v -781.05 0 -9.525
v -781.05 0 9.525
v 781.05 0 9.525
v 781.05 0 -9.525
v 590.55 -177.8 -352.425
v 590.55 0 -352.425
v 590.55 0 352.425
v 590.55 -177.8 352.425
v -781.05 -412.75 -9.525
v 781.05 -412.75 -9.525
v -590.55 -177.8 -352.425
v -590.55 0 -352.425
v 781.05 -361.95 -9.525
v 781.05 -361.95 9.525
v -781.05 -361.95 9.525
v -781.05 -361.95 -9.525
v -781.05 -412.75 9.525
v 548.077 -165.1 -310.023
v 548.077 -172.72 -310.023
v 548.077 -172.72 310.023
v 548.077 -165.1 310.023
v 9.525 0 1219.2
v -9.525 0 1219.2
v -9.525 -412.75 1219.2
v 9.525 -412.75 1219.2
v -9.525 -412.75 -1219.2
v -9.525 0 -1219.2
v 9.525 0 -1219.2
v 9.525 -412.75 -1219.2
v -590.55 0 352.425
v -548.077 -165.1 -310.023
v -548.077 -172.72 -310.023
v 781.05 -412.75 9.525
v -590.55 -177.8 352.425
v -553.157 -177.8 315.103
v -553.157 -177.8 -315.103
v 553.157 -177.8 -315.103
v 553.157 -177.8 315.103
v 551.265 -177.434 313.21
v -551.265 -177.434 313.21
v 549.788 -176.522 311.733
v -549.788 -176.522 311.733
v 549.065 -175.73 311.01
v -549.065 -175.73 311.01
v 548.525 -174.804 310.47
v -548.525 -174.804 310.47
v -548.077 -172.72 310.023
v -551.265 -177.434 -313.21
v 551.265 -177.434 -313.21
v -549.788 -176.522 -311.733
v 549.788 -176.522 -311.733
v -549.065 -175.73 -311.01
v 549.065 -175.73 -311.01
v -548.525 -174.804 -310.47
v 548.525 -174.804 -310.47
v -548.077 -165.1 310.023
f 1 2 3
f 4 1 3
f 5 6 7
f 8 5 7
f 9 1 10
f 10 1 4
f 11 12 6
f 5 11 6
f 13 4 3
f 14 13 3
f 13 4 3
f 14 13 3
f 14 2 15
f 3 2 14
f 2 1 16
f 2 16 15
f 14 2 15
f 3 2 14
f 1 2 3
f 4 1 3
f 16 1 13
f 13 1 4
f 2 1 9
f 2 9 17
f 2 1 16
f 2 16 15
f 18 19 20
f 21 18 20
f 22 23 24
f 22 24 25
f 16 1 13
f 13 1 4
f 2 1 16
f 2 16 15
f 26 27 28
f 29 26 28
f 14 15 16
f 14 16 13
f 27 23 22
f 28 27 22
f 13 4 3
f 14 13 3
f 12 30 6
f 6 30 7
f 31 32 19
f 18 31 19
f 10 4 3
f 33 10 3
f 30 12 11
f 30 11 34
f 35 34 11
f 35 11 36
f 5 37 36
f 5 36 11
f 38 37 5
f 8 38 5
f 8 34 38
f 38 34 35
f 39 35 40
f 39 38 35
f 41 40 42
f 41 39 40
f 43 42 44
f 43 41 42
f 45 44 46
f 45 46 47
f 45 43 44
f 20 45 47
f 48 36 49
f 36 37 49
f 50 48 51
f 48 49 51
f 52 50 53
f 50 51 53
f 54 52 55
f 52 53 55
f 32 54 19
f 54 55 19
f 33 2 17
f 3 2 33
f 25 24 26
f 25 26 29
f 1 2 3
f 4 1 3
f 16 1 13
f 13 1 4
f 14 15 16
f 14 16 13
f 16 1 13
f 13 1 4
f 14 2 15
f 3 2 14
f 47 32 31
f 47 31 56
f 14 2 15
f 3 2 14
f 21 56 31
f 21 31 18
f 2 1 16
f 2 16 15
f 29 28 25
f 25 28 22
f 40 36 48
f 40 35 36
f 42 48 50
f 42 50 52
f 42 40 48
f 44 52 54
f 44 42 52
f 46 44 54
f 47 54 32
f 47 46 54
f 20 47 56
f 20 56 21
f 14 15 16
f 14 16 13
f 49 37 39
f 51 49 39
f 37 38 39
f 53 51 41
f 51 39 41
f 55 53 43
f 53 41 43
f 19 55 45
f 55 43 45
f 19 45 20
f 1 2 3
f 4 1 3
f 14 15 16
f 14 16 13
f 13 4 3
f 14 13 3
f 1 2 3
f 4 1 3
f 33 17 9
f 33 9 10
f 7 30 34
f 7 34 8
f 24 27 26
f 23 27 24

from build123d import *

# Parameters (mm, degrees)
F0_W      = 1181.1
F0_H      = 704.85
F1_DEPTH  = 177.8
F4_W      = 1562.1
F4_H      = 19.05
F5_DEPTH  = 412.75
F6_DEPTH  = 361.95
F7_DEPTH  = 361.95
F8_DEPTH  = 361.95
F9_DEPTH  = 361.95
F3_W      = 19.05
F3_H      = 2438.4
F10_DEPTH = 412.75
F2_W      = 1096.154452
F2_H      = 620.045066
F11_DEPTH = 12.7
F13_R     = 5.08


with BuildPart() as f1:
    # F0 (on Front) → F1 (new body)
    with BuildSketch(Plane.XZ):
        Rectangle(F0_W, F0_H)
    extrude(amount=F1_DEPTH)


with BuildPart() as f5:
    # F4 (on Front) → F5 (new body)
    with BuildSketch(Plane.XZ):
        Rectangle(F4_W, F4_H)
    extrude(amount=F5_DEPTH)


with BuildPart() as f6:
    # F4 (on Front) → F6 (new body)
    with BuildSketch(Plane.XZ):
        Rectangle(F4_W, F4_H)
    extrude(amount=F6_DEPTH)


with BuildPart() as f7:
    # F4 (on Front) → F7 (new body)
    with BuildSketch(Plane.XZ):
        Rectangle(F4_W, F4_H)
    extrude(amount=F7_DEPTH)


with BuildPart() as f8:
    # F4 (on Front) → F8 (new body)
    with BuildSketch(Plane.XZ):
        Rectangle(F4_W, F4_H)
    extrude(amount=F8_DEPTH)


with BuildPart() as f9:
    # F4 (on Front) → F9 (new body)
    with BuildSketch(Plane.XZ):
        Rectangle(F4_W, F4_H)
    extrude(amount=F9_DEPTH)


with BuildPart() as f10:
    # F3 (on Front) → F10 (new body)
    with BuildSketch(Plane.XZ):
        Rectangle(F3_W, F3_H)
    extrude(amount=F10_DEPTH)


with BuildPart() as f11:
    # F2 (on face) → F11 (new body, symmetric)
    with BuildSketch(Plane.XZ.offset(177.8)):
        Rectangle(F2_W, F2_H)
    extrude(amount=F11_DEPTH, both=True)


with BuildPart() as f1_1:
    add(f1.part)

    # F12: cut F11
    add(f11.part, mode=Mode.SUBTRACT)

    # F13
    f13_edges = [f1_1.edges().sort_by_distance(p)[0] for p in [
        (-548.077226, -177.8, 0),
        (0, -177.8, 310.022533),
        (548.077226, -177.8, 0),
        (0, -177.8, -310.022533),
    ]]
    fillet(f13_edges, radius=F13_R)


solid = Compound([f5.part, f6.part, f7.part, f8.part, f9.part, f10.part, f1_1.part])
